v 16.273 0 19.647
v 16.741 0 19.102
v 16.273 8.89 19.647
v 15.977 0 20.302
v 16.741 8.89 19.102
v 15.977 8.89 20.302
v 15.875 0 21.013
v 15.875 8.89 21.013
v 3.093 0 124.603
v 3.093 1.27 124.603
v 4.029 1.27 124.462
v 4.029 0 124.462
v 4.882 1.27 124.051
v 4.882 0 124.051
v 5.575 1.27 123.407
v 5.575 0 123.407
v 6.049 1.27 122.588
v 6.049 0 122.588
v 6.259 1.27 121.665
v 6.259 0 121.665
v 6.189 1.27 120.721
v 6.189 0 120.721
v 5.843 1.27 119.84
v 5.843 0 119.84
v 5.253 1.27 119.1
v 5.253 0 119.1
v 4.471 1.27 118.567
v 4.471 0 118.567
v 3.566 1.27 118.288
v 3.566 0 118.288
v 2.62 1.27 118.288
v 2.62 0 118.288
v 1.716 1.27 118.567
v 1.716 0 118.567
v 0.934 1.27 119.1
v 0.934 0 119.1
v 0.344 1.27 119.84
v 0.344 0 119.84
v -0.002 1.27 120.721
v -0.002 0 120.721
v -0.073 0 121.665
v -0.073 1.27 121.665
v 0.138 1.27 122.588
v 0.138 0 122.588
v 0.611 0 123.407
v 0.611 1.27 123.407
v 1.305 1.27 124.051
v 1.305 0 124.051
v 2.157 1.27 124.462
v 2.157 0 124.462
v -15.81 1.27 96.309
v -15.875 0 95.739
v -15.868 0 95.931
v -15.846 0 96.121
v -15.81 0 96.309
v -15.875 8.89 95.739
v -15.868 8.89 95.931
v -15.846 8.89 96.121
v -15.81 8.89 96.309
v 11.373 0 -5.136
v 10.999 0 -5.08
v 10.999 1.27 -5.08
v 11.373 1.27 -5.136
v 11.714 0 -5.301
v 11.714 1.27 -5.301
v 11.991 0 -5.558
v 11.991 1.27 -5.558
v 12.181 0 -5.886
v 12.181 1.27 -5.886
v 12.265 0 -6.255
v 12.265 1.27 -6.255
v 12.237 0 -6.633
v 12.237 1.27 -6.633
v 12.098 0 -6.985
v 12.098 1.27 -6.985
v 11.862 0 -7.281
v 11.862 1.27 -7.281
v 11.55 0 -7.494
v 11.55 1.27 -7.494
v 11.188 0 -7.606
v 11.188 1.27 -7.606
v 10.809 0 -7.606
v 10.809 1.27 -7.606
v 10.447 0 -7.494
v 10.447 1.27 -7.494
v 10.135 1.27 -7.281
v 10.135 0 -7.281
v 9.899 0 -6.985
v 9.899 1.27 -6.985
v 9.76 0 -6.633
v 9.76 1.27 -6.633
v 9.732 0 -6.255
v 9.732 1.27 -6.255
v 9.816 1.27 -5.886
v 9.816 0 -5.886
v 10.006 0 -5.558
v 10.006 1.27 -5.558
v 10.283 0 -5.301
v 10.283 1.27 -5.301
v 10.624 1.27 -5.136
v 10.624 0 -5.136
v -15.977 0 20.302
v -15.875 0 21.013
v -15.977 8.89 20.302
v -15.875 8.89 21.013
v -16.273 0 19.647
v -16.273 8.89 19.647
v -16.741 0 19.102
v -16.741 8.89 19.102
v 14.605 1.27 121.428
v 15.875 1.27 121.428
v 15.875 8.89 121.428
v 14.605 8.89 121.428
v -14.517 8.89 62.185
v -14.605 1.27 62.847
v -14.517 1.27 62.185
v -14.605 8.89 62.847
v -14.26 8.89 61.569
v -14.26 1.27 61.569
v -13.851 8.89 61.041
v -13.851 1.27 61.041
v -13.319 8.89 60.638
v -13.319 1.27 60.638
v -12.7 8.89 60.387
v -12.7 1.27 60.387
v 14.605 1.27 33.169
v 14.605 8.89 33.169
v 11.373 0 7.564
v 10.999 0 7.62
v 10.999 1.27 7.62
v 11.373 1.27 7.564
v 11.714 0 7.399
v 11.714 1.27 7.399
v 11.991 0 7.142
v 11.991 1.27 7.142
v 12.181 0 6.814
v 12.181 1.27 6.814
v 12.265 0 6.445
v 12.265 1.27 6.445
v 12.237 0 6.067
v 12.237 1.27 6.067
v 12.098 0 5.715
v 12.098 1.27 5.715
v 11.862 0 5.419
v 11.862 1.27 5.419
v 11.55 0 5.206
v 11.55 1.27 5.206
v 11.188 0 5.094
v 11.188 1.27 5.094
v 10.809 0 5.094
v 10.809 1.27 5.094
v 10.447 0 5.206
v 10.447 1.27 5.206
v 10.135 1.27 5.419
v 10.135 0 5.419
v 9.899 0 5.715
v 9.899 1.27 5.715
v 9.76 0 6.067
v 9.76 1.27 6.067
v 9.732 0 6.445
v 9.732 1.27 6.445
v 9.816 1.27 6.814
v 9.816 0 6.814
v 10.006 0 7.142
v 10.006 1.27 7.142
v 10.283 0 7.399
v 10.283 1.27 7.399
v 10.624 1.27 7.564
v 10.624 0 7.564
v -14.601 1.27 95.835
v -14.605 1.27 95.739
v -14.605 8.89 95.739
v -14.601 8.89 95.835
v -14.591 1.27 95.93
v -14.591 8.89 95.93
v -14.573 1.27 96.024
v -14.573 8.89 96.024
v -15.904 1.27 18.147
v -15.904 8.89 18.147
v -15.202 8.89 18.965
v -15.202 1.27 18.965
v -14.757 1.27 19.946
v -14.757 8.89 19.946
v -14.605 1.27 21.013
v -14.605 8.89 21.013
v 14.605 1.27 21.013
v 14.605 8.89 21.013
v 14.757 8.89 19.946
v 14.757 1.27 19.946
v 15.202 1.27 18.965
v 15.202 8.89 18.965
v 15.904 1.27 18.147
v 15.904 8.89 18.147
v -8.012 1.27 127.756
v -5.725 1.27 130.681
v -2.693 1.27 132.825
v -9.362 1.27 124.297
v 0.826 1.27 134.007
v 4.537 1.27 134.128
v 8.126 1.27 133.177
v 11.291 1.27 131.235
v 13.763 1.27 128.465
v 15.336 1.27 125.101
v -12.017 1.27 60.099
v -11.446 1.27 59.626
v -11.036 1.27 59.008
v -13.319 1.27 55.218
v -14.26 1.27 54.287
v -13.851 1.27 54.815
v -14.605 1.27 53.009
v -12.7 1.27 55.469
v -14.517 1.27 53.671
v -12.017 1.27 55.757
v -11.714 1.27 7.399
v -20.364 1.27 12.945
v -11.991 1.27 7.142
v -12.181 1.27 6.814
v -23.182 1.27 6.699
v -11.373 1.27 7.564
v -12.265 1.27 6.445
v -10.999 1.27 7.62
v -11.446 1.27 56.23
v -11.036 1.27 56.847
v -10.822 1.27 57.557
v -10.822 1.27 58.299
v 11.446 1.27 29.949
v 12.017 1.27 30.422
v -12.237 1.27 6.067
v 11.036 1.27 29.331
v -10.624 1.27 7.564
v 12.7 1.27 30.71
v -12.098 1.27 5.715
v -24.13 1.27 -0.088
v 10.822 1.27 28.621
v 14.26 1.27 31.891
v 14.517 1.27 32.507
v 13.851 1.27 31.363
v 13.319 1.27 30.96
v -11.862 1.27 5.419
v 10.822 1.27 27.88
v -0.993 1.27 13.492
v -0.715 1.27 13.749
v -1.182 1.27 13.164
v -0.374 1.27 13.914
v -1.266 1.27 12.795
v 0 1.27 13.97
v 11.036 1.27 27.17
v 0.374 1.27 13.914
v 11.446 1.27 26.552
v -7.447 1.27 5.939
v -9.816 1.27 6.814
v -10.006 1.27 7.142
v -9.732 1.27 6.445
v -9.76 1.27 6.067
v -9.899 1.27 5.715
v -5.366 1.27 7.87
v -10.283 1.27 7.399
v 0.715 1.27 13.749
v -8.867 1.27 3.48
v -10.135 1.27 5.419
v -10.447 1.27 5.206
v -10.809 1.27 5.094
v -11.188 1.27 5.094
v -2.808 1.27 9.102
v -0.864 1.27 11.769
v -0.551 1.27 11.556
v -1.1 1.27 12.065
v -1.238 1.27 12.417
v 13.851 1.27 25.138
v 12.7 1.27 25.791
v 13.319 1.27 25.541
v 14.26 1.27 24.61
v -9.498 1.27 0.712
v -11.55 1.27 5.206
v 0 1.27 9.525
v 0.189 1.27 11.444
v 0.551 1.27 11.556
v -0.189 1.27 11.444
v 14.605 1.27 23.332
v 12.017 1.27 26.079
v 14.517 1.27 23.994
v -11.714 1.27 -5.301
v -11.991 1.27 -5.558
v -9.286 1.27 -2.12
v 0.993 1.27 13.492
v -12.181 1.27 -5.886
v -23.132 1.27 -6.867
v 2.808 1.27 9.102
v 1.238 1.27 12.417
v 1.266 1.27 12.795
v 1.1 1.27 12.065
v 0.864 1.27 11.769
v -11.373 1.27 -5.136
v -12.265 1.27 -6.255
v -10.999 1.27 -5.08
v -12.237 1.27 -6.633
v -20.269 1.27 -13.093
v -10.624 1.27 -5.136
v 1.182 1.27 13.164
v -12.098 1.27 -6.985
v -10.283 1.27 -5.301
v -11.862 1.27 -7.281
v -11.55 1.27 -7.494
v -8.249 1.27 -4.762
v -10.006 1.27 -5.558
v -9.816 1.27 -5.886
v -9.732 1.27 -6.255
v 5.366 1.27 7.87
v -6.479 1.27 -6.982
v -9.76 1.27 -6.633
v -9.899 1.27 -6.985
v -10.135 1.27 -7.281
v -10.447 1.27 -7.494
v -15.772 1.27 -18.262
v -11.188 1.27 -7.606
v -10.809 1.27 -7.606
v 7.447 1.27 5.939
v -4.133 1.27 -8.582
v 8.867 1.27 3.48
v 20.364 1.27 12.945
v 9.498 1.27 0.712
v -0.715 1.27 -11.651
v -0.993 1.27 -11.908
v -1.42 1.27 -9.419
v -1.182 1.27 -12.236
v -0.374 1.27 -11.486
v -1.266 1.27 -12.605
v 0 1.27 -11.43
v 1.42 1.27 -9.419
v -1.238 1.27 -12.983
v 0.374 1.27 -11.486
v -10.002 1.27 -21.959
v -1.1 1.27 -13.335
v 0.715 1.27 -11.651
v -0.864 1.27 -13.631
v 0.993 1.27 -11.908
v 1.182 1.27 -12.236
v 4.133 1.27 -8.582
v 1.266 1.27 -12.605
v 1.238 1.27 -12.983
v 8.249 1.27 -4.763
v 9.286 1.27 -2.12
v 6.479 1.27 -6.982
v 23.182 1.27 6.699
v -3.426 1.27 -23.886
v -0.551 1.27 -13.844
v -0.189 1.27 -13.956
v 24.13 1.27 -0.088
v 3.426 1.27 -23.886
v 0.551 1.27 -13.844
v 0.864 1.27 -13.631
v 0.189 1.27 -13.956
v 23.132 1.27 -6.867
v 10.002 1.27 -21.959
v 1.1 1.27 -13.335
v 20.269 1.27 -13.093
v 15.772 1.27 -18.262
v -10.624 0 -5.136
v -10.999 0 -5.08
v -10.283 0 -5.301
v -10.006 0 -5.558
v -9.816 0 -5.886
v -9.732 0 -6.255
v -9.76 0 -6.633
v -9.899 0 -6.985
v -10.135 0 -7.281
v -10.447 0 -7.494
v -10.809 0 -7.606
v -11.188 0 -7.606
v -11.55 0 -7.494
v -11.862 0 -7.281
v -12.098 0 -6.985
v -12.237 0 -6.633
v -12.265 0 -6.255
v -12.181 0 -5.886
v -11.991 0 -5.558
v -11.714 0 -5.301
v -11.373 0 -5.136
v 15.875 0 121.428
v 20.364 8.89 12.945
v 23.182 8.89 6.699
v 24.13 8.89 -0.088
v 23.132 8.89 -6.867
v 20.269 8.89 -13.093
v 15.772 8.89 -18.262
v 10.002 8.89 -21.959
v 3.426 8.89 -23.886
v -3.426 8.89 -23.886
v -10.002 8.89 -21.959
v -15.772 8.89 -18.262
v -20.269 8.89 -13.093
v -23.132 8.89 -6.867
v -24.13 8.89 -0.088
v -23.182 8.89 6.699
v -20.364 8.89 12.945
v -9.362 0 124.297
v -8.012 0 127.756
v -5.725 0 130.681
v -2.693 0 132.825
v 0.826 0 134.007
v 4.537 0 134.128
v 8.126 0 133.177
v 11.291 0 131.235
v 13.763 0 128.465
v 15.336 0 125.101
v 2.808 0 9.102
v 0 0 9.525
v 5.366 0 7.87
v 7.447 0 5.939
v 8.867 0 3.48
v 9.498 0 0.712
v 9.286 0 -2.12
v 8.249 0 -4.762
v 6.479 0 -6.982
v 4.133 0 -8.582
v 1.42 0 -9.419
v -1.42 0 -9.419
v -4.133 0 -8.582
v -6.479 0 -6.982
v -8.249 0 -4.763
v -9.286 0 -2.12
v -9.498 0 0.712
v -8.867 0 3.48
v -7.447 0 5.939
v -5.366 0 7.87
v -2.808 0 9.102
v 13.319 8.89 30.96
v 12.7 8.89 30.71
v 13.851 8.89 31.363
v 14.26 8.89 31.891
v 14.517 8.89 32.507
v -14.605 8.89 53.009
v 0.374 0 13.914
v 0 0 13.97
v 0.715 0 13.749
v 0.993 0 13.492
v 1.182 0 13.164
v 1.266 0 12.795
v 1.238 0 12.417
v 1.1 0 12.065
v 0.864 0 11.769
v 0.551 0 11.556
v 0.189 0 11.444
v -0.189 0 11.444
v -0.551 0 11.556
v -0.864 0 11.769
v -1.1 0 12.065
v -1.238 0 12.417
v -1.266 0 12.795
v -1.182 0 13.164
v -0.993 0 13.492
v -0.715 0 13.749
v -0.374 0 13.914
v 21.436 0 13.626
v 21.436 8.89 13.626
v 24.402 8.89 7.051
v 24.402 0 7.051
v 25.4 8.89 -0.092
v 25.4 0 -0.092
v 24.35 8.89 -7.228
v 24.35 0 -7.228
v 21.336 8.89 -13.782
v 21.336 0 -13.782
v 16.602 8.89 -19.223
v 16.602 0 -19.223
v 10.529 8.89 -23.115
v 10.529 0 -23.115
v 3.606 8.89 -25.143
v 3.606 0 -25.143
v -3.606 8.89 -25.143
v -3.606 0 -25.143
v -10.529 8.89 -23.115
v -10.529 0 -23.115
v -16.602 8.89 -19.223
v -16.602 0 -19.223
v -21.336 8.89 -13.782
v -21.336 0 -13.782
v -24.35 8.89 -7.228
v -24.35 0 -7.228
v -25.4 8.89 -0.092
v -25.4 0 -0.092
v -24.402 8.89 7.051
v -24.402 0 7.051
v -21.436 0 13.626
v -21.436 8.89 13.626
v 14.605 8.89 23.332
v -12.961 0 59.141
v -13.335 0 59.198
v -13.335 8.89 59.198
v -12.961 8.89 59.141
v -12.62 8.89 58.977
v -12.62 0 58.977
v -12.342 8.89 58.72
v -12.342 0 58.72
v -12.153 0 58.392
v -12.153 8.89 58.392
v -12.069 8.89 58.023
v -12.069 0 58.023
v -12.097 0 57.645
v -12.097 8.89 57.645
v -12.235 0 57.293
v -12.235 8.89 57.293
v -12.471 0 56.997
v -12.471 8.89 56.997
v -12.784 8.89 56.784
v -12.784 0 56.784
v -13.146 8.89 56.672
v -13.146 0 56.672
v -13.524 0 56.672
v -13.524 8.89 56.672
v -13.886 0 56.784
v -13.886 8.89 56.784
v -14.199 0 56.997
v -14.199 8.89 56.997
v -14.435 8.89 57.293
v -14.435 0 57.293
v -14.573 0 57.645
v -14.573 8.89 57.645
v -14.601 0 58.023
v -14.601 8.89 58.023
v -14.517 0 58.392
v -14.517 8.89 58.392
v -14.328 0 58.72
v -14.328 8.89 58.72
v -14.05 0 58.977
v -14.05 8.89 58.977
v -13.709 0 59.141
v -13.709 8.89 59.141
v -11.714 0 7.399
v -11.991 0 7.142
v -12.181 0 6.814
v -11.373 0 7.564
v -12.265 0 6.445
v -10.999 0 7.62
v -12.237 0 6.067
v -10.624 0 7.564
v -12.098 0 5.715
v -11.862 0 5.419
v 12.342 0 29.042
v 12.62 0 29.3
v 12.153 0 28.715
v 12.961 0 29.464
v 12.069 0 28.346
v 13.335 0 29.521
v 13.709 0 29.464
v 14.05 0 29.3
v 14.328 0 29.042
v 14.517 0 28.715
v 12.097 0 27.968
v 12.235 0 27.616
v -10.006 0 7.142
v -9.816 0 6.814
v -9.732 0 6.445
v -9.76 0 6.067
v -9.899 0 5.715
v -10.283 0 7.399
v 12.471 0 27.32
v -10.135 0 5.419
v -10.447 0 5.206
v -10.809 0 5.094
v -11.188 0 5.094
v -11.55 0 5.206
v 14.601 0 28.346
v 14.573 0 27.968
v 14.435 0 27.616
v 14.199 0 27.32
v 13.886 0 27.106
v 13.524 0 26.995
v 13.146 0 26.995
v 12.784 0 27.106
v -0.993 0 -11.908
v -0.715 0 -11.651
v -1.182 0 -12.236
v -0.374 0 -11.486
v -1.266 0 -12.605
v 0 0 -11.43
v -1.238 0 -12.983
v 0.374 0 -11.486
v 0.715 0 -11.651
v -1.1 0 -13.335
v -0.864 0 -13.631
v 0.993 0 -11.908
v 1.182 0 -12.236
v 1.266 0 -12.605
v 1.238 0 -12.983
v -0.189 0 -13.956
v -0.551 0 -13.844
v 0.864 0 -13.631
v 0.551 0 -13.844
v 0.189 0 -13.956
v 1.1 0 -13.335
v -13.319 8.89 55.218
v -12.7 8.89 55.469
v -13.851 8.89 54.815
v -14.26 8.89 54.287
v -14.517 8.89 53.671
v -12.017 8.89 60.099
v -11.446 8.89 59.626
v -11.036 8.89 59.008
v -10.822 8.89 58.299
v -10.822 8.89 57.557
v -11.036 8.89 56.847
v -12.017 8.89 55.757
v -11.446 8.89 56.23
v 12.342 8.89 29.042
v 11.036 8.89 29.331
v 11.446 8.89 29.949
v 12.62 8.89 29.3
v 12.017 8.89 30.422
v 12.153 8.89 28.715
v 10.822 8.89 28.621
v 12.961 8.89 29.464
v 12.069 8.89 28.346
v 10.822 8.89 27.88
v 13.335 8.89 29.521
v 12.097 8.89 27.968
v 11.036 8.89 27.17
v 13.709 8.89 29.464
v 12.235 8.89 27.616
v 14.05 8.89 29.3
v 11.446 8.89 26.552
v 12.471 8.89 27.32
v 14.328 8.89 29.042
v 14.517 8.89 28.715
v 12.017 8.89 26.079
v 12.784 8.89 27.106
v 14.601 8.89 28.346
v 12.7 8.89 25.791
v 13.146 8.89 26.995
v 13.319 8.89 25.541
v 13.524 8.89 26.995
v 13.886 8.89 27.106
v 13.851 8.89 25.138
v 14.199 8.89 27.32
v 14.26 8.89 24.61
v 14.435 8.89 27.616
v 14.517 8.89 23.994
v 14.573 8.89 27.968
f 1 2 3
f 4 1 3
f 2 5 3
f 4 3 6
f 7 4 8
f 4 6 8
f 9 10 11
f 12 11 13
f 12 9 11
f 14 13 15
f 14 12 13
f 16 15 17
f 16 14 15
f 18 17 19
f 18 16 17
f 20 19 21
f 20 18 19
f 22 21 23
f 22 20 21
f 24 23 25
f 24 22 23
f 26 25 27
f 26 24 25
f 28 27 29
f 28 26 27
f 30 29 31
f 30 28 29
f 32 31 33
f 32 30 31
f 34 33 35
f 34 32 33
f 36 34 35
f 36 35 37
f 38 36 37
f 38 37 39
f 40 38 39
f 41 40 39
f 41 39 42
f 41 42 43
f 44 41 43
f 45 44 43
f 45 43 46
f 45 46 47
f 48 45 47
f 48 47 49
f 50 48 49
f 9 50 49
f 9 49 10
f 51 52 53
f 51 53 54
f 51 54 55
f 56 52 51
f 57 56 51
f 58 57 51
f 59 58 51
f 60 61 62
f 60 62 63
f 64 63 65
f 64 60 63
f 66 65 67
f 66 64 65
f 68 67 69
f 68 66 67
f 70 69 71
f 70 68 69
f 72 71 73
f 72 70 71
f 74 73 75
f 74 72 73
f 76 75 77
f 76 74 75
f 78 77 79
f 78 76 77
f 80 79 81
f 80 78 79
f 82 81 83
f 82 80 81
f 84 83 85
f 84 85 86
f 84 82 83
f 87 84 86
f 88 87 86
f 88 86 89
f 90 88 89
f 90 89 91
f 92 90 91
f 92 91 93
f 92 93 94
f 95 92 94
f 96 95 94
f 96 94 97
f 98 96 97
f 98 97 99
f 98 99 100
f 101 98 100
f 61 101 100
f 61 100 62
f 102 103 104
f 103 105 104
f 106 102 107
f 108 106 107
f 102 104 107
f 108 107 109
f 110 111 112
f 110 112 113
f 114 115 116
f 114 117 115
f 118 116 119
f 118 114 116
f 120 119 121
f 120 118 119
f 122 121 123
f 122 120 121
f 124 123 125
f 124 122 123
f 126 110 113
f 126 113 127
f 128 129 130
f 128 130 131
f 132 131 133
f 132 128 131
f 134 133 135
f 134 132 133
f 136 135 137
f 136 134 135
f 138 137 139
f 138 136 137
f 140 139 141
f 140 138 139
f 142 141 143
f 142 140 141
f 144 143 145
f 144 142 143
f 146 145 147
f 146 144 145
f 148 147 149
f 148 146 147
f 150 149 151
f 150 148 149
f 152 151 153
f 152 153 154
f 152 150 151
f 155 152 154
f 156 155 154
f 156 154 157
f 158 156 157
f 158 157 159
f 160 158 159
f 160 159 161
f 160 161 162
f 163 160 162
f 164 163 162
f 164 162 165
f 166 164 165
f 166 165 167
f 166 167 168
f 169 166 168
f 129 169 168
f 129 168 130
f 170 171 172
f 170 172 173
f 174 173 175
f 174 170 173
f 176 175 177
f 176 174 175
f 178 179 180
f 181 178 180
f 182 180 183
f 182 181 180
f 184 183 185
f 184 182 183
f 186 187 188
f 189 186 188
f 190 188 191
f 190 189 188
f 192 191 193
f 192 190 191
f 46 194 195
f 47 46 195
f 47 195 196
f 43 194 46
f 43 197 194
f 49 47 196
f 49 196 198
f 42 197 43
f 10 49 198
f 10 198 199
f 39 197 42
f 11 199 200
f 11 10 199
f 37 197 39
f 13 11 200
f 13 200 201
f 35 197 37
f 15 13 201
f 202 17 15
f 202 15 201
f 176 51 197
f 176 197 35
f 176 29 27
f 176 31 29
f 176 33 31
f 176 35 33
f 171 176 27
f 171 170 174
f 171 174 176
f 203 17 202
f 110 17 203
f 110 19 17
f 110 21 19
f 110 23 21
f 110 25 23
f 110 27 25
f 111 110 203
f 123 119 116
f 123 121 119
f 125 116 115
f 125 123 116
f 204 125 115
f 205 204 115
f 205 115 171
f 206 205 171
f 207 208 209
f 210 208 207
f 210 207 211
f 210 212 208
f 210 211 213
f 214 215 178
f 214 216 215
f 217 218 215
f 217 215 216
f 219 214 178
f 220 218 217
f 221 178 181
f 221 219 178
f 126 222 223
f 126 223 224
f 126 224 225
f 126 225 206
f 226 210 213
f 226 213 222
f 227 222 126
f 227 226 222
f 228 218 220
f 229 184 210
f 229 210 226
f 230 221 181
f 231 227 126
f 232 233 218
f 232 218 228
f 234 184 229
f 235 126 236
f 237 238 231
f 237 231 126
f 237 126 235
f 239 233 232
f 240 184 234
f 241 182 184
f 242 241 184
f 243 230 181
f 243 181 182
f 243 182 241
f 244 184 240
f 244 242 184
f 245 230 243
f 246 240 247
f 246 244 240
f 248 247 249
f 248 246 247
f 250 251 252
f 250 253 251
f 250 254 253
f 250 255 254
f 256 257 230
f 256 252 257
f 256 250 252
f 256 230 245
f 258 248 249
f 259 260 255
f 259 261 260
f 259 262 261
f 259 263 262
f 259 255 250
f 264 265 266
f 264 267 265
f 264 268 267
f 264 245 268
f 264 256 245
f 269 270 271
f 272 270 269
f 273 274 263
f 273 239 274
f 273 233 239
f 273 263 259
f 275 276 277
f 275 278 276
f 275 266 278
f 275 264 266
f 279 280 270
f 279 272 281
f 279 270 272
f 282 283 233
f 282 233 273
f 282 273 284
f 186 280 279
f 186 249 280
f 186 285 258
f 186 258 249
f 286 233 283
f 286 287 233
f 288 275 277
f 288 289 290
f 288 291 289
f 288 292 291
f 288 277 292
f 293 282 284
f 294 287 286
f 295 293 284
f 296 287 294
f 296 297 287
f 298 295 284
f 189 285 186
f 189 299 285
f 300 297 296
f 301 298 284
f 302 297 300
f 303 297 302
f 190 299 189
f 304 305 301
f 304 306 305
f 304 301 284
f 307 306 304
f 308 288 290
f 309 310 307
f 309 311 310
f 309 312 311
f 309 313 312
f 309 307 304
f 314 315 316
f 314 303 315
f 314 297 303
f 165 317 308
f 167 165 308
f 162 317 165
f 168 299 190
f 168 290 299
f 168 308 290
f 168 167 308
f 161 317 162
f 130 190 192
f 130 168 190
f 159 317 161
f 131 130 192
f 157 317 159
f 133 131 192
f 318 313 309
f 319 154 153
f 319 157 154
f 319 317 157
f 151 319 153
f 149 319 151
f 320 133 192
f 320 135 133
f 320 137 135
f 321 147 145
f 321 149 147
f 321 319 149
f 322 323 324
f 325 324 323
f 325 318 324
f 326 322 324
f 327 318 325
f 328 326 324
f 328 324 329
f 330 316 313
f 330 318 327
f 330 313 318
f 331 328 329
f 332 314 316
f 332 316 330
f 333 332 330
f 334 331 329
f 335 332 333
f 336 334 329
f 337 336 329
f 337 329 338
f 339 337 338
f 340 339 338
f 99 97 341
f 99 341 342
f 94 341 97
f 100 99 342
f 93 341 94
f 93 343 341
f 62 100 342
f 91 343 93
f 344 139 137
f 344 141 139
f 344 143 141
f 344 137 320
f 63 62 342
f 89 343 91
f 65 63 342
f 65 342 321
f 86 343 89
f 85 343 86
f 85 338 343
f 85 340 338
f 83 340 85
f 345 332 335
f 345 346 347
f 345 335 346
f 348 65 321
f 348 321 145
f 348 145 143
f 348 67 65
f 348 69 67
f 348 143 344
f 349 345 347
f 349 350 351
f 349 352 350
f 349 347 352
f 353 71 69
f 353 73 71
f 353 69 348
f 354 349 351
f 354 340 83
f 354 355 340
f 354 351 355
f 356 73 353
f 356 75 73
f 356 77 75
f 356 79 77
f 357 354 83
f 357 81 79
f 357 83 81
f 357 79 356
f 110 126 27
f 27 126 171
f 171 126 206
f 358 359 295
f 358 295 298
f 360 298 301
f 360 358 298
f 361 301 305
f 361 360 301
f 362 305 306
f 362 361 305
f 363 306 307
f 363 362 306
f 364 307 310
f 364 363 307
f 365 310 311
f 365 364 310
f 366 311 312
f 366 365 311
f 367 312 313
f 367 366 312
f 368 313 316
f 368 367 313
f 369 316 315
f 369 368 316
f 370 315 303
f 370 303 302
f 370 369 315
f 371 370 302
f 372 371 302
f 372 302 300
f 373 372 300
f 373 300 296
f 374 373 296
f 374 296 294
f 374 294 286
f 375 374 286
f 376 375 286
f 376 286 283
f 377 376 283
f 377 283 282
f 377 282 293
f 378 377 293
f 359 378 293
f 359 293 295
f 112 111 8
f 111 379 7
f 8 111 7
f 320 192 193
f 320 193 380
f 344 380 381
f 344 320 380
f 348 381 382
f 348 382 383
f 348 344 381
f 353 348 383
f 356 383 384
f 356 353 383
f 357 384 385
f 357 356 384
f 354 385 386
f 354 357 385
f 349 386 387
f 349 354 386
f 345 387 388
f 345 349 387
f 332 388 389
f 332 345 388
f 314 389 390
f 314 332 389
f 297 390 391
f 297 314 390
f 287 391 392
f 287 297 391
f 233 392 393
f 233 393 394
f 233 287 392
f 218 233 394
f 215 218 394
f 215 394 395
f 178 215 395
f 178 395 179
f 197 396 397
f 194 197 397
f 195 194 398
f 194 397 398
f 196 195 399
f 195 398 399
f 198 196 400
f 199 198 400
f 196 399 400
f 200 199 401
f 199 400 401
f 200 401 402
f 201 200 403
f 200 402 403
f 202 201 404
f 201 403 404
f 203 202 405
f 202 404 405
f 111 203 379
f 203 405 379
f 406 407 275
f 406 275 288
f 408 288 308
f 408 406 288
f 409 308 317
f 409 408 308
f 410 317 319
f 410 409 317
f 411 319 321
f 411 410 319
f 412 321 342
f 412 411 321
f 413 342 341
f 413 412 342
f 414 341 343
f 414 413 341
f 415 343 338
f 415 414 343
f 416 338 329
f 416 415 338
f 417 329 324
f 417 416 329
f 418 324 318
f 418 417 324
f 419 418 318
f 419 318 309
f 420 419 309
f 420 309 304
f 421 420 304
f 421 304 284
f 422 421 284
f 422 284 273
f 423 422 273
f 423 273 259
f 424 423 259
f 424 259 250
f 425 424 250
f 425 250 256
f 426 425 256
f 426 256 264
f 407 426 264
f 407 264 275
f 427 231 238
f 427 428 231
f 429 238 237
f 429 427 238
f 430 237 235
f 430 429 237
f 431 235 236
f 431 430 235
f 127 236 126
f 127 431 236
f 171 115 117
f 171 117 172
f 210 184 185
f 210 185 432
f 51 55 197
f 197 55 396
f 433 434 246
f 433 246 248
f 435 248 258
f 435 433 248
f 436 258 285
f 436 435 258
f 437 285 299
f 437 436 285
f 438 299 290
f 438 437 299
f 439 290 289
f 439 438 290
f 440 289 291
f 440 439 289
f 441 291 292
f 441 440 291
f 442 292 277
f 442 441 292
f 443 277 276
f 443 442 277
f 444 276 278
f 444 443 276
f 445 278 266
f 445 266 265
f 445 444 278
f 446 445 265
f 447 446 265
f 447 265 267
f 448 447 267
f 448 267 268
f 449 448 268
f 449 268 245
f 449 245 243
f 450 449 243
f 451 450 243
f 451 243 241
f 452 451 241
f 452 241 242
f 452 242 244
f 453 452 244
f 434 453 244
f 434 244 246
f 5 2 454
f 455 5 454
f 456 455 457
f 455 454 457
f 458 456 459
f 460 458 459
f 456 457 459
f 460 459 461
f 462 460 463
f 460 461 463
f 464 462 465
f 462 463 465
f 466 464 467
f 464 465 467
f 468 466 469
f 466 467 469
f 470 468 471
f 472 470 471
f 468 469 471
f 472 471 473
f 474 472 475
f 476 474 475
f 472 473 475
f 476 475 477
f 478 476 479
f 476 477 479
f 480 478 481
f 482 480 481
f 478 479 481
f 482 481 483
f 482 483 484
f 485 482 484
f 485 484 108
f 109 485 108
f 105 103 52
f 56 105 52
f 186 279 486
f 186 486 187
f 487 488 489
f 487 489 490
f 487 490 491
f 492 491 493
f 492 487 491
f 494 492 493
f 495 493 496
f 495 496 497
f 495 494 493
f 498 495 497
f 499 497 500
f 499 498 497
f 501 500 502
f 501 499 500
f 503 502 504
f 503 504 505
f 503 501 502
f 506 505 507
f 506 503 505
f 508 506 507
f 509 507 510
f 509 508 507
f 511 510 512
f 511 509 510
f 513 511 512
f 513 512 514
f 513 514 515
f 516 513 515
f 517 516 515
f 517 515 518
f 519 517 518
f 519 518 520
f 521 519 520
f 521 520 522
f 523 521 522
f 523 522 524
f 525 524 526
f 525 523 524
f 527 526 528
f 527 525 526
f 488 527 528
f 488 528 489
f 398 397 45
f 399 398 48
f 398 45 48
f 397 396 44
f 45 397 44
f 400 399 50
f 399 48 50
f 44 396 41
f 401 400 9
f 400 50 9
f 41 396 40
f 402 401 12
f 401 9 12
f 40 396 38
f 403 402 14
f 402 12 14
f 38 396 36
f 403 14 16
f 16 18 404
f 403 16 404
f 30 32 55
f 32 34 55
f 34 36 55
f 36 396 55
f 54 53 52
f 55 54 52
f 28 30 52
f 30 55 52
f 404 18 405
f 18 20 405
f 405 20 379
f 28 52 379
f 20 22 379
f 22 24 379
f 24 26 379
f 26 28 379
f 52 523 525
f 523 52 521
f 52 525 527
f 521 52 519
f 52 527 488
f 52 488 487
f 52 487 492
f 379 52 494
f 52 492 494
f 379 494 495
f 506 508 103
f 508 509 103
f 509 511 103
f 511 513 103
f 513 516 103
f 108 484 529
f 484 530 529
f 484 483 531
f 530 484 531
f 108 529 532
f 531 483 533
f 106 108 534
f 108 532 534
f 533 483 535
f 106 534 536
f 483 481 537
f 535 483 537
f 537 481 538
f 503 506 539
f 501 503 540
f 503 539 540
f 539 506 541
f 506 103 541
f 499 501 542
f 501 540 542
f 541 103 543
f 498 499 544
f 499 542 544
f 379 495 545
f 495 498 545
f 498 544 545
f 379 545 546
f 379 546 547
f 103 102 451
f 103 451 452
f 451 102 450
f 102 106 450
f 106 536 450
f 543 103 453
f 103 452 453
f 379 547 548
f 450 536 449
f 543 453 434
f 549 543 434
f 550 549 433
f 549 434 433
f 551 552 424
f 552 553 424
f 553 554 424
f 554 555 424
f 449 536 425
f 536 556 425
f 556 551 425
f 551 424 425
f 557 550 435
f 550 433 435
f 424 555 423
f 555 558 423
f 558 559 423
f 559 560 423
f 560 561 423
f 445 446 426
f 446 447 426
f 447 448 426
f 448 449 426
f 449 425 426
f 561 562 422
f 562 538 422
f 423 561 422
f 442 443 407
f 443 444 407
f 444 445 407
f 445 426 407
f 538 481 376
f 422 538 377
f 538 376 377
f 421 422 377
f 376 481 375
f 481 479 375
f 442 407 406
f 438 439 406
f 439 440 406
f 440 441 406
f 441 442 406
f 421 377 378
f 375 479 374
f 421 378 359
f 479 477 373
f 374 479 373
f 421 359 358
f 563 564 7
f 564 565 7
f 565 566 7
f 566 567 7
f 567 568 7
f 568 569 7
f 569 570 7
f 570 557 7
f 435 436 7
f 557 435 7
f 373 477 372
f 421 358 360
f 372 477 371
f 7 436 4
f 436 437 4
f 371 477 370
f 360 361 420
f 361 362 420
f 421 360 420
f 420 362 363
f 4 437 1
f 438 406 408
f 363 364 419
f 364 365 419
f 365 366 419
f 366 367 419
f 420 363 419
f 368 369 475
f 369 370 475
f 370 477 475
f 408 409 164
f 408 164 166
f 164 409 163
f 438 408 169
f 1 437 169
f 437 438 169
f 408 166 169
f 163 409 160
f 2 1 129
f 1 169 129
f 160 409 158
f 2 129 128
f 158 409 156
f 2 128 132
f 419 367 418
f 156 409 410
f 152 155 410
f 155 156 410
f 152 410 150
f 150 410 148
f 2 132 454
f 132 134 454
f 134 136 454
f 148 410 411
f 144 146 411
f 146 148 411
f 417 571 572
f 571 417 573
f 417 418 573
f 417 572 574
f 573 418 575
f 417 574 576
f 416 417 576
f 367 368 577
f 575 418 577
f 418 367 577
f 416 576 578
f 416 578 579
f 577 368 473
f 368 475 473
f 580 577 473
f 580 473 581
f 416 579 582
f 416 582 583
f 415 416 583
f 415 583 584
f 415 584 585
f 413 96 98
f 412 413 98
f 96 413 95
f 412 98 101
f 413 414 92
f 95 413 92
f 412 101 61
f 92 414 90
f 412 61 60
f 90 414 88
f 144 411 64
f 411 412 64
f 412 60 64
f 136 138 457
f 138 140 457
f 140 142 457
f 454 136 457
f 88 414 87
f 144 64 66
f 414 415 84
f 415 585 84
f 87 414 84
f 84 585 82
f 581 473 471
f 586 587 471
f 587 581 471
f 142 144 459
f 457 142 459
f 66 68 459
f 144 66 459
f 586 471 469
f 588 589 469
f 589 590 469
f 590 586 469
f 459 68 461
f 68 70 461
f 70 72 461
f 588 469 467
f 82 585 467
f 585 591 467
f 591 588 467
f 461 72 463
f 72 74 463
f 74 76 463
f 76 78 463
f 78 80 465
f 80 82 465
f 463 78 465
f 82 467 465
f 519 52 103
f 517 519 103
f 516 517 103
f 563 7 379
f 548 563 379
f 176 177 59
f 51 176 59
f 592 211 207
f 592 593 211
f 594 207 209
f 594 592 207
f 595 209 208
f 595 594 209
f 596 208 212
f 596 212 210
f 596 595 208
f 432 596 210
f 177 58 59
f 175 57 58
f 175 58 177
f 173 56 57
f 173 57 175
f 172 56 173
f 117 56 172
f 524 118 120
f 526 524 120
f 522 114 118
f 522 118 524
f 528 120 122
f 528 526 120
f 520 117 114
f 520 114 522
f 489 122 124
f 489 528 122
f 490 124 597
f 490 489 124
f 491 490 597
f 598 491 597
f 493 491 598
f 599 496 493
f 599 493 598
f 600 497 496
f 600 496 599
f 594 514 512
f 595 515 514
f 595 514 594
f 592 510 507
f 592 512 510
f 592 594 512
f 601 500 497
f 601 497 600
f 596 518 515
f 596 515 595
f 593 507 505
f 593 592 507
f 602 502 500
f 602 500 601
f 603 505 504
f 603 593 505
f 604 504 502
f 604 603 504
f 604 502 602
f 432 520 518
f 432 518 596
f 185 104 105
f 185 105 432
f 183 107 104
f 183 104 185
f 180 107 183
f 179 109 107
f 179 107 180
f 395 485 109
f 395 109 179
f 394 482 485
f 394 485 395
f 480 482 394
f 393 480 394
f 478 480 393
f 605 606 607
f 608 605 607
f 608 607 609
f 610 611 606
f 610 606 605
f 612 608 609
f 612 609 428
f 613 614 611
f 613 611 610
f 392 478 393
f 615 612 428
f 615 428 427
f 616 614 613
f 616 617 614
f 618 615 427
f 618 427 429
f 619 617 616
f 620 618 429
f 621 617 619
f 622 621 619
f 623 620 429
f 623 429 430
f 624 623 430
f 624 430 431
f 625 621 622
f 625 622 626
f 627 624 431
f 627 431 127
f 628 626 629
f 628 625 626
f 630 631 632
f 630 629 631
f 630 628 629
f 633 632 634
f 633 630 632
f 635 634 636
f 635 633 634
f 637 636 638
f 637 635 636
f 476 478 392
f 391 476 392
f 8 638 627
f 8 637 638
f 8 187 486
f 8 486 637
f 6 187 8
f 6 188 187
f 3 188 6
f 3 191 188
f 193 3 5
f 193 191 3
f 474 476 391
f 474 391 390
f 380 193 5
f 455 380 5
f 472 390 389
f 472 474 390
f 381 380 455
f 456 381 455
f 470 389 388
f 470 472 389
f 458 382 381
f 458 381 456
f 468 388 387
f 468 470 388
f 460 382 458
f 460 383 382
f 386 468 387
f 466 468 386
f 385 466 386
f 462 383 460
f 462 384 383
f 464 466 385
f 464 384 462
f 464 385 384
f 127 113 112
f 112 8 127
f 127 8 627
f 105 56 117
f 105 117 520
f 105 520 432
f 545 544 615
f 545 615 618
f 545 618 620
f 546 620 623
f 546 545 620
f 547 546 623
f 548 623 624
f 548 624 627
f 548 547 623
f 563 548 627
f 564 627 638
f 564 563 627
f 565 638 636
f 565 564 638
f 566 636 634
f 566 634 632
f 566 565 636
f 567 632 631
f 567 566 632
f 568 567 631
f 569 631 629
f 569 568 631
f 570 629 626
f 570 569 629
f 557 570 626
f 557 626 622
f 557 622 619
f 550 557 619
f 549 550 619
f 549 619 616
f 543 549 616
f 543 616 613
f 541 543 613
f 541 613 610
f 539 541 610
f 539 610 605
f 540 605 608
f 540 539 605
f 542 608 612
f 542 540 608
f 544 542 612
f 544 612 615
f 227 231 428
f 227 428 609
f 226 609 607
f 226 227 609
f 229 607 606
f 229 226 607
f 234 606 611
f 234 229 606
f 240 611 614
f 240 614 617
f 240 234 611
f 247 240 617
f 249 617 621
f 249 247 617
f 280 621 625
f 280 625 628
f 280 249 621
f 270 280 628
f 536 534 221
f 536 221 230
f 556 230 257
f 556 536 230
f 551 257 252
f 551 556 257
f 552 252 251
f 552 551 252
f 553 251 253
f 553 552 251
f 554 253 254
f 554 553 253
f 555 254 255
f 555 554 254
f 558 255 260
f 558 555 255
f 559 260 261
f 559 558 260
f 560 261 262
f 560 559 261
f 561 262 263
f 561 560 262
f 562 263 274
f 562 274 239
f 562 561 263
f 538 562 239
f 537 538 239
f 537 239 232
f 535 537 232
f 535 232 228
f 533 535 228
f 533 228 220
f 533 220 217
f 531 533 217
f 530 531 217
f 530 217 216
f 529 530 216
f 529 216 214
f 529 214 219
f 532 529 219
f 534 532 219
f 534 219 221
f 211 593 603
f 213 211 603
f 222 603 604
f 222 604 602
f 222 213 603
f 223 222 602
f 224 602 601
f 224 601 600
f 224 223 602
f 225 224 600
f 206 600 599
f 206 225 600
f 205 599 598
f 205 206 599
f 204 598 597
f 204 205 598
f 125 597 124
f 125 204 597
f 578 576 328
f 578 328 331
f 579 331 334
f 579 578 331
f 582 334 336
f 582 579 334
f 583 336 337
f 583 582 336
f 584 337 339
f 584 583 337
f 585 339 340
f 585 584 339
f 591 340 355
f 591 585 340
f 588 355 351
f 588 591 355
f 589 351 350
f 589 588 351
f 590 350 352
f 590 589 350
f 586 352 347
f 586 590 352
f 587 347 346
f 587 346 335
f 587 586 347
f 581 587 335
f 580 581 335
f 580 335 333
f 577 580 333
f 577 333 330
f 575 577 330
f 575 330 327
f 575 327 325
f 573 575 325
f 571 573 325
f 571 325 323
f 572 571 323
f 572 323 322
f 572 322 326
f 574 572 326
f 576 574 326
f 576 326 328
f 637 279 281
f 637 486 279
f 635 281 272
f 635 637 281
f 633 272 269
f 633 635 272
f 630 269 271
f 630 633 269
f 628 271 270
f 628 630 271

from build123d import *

# Parameters (mm, degrees)
SKETCH1_R           = 1.27
SKETCH1_R_2         = 3.175
SKETCH1_R_3         = 9.525
BOSS_EXTRUDE1_DEPTH = 8.89
FILLET1_R           = 2.54
SHELL2_START        = 1.27
SHELL2_OUTLINE_R    = 3.175
SHELL2_OUTLINE_R_2  = 1.27
SHELL2_OUTLINE_R_3  = 9.525
SHELL2_DEPTH        = 7.62
FILLET2_R           = 2.54


# Read off the part's stored shape, not the designer's step: Shell2
with BuildPart() as part:
    # Sketch1 → Boss-Extrude1 (new body)
    with BuildSketch(Plane(origin=(0, 0, 0), x_dir=(1, 0, 0), z_dir=(0, 1, 0))):
        with BuildLine():
            Line((-15.875, -19.827868645), (-15.875, -96.027868645))
            Line((-15.875, -96.027868645), (-9.362396438, -124.297332186))
            ThreePointArc((-9.362396438, -124.297332186), (4.537150087, -134.127868645), (15.875, -121.427868645))
            Line((15.875, -121.427868645), (15.875, -96.027868645))
            Line((15.875, -96.027868645), (15.875, -19.827868645))
            ThreePointArc((15.875, -19.827868645), (0, 25.4), (-15.875, -19.827868645))
        make_face()
        with Locations(Location((0, 12.7, 0), (0, 0, 270))):
            Circle(SKETCH1_R, mode=Mode.SUBTRACT)
        with Locations(Location((10.998522628, 6.35, 0), (0, 0, 270))):
            Circle(SKETCH1_R, mode=Mode.SUBTRACT)
        with Locations(Location((10.998522628, -6.35, 0), (0, 0, 270))):
            Circle(SKETCH1_R, mode=Mode.SUBTRACT)
        with Locations(Location((0, -12.7, 0), (0, 0, 270))):
            Circle(SKETCH1_R, mode=Mode.SUBTRACT)
        with Locations(Location((-10.998522628, -6.35, 0), (0, 0, 270))):
            Circle(SKETCH1_R, mode=Mode.SUBTRACT)
        with Locations(Location((-10.998522628, 6.35, 0), (0, 0, 270))):
            Circle(SKETCH1_R, mode=Mode.SUBTRACT)
        with Locations(Location((3.093174395, -121.427868645, 0), (0, 0, 270))):
            Circle(SKETCH1_R_2, mode=Mode.SUBTRACT)
        with Locations(Location((-13.335, -57.927868645, 0), (0, 0, 270))):
            Circle(SKETCH1_R, mode=Mode.SUBTRACT)
        with Locations(Location((13.335, -28.25059986, 0), (0, 0, 270))):
            Circle(SKETCH1_R, mode=Mode.SUBTRACT)
        with Locations(Location((0, 0, 0), (0, 0, 270))):
            Circle(SKETCH1_R_3, mode=Mode.SUBTRACT)
    extrude(amount=BOSS_EXTRUDE1_DEPTH)

    # Fillet1
    fillet1_edges = [part.edges().sort_by_distance(p)[0] for p in [
        (15.875, 4.445, 19.827868645),
        (-15.875, 4.445, 96.027868645),
        (-15.875, 4.445, 19.827868645),
    ]]
    fillet(fillet1_edges, radius=FILLET1_R)

    # Shell2 outline → Shell2 (cut)
    with BuildSketch(Plane(origin=(0, 0, 0), x_dir=(1, 0, 0), z_dir=(0, 1, 0)).offset(SHELL2_START)):
        with BuildLine():
            Line((14.605, -121.427868645), (14.605, -30.450304386))
            ThreePointArc((14.605, -30.450304386), (10.795, -28.25059986), (14.605, -26.050895335))
            Line((14.605, -26.050895335), (14.605, -21.012647977))
            ThreePointArc((14.605, -21.012647977), (14.944875395, -19.439645997), (15.903863636, -18.147286889))
            ThreePointArc((15.903863636, -18.147286889), (0, 24.13), (-15.903863636, -18.147286889))
            ThreePointArc((-15.903863636, -18.147286889), (-14.944875395, -19.439645997), (-14.605, -21.012647977))
            Line((-14.605, -21.012647977), (-14.605, -55.728164119))
            ThreePointArc((-14.605, -55.728164119), (-10.795, -57.927868645), (-14.605, -60.127573171))
            Line((-14.605, -60.127573171), (-14.605, -95.739073507))
            ThreePointArc((-14.605, -95.739073507), (-14.596869822, -95.882546684), (-14.572583382, -96.024182912))
            Line((-14.572583382, -96.024182912), (-15.810166764, -96.309292317))
            Line((-15.810166764, -96.309292317), (-9.362396438, -124.297332186))
            ThreePointArc((-9.362396438, -124.297332186), (4.537150087, -134.127868645), (15.875, -121.427868645))
            Line((15.875, -121.427868645), (14.605, -121.427868645))
        make_face()
        with Locations((3.093174395, -121.427868645)):
            Circle(SHELL2_OUTLINE_R, mode=Mode.SUBTRACT)
        with Locations((-10.998522628, -6.35)):
            Circle(SHELL2_OUTLINE_R_2, mode=Mode.SUBTRACT)
        with Locations((0, -12.7)):
            Circle(SHELL2_OUTLINE_R_2, mode=Mode.SUBTRACT)
        Circle(SHELL2_OUTLINE_R_3, mode=Mode.SUBTRACT)
        with Locations((-10.998522628, 6.35)):
            Circle(SHELL2_OUTLINE_R_2, mode=Mode.SUBTRACT)
        with Locations((0, 12.7)):
            Circle(SHELL2_OUTLINE_R_2, mode=Mode.SUBTRACT)
        with Locations((10.998522628, -6.35)):
            Circle(SHELL2_OUTLINE_R_2, mode=Mode.SUBTRACT)
        with Locations((10.998522628, 6.35)):
            Circle(SHELL2_OUTLINE_R_2, mode=Mode.SUBTRACT)
    extrude(amount=SHELL2_DEPTH, mode=Mode.SUBTRACT)

    # Fillet2
    fillet2_edges = [part.edges().sort_by_distance(p)[0] for p in [
        (14.605, 5.08, 30.450304386),
        (-14.605, 5.08, 55.728164119),
        (-14.605, 5.08, 60.127573171),
        (14.605, 5.08, 26.050895335),
    ]]
    fillet(fillet2_edges, radius=FILLET2_R)


solid = part.part
